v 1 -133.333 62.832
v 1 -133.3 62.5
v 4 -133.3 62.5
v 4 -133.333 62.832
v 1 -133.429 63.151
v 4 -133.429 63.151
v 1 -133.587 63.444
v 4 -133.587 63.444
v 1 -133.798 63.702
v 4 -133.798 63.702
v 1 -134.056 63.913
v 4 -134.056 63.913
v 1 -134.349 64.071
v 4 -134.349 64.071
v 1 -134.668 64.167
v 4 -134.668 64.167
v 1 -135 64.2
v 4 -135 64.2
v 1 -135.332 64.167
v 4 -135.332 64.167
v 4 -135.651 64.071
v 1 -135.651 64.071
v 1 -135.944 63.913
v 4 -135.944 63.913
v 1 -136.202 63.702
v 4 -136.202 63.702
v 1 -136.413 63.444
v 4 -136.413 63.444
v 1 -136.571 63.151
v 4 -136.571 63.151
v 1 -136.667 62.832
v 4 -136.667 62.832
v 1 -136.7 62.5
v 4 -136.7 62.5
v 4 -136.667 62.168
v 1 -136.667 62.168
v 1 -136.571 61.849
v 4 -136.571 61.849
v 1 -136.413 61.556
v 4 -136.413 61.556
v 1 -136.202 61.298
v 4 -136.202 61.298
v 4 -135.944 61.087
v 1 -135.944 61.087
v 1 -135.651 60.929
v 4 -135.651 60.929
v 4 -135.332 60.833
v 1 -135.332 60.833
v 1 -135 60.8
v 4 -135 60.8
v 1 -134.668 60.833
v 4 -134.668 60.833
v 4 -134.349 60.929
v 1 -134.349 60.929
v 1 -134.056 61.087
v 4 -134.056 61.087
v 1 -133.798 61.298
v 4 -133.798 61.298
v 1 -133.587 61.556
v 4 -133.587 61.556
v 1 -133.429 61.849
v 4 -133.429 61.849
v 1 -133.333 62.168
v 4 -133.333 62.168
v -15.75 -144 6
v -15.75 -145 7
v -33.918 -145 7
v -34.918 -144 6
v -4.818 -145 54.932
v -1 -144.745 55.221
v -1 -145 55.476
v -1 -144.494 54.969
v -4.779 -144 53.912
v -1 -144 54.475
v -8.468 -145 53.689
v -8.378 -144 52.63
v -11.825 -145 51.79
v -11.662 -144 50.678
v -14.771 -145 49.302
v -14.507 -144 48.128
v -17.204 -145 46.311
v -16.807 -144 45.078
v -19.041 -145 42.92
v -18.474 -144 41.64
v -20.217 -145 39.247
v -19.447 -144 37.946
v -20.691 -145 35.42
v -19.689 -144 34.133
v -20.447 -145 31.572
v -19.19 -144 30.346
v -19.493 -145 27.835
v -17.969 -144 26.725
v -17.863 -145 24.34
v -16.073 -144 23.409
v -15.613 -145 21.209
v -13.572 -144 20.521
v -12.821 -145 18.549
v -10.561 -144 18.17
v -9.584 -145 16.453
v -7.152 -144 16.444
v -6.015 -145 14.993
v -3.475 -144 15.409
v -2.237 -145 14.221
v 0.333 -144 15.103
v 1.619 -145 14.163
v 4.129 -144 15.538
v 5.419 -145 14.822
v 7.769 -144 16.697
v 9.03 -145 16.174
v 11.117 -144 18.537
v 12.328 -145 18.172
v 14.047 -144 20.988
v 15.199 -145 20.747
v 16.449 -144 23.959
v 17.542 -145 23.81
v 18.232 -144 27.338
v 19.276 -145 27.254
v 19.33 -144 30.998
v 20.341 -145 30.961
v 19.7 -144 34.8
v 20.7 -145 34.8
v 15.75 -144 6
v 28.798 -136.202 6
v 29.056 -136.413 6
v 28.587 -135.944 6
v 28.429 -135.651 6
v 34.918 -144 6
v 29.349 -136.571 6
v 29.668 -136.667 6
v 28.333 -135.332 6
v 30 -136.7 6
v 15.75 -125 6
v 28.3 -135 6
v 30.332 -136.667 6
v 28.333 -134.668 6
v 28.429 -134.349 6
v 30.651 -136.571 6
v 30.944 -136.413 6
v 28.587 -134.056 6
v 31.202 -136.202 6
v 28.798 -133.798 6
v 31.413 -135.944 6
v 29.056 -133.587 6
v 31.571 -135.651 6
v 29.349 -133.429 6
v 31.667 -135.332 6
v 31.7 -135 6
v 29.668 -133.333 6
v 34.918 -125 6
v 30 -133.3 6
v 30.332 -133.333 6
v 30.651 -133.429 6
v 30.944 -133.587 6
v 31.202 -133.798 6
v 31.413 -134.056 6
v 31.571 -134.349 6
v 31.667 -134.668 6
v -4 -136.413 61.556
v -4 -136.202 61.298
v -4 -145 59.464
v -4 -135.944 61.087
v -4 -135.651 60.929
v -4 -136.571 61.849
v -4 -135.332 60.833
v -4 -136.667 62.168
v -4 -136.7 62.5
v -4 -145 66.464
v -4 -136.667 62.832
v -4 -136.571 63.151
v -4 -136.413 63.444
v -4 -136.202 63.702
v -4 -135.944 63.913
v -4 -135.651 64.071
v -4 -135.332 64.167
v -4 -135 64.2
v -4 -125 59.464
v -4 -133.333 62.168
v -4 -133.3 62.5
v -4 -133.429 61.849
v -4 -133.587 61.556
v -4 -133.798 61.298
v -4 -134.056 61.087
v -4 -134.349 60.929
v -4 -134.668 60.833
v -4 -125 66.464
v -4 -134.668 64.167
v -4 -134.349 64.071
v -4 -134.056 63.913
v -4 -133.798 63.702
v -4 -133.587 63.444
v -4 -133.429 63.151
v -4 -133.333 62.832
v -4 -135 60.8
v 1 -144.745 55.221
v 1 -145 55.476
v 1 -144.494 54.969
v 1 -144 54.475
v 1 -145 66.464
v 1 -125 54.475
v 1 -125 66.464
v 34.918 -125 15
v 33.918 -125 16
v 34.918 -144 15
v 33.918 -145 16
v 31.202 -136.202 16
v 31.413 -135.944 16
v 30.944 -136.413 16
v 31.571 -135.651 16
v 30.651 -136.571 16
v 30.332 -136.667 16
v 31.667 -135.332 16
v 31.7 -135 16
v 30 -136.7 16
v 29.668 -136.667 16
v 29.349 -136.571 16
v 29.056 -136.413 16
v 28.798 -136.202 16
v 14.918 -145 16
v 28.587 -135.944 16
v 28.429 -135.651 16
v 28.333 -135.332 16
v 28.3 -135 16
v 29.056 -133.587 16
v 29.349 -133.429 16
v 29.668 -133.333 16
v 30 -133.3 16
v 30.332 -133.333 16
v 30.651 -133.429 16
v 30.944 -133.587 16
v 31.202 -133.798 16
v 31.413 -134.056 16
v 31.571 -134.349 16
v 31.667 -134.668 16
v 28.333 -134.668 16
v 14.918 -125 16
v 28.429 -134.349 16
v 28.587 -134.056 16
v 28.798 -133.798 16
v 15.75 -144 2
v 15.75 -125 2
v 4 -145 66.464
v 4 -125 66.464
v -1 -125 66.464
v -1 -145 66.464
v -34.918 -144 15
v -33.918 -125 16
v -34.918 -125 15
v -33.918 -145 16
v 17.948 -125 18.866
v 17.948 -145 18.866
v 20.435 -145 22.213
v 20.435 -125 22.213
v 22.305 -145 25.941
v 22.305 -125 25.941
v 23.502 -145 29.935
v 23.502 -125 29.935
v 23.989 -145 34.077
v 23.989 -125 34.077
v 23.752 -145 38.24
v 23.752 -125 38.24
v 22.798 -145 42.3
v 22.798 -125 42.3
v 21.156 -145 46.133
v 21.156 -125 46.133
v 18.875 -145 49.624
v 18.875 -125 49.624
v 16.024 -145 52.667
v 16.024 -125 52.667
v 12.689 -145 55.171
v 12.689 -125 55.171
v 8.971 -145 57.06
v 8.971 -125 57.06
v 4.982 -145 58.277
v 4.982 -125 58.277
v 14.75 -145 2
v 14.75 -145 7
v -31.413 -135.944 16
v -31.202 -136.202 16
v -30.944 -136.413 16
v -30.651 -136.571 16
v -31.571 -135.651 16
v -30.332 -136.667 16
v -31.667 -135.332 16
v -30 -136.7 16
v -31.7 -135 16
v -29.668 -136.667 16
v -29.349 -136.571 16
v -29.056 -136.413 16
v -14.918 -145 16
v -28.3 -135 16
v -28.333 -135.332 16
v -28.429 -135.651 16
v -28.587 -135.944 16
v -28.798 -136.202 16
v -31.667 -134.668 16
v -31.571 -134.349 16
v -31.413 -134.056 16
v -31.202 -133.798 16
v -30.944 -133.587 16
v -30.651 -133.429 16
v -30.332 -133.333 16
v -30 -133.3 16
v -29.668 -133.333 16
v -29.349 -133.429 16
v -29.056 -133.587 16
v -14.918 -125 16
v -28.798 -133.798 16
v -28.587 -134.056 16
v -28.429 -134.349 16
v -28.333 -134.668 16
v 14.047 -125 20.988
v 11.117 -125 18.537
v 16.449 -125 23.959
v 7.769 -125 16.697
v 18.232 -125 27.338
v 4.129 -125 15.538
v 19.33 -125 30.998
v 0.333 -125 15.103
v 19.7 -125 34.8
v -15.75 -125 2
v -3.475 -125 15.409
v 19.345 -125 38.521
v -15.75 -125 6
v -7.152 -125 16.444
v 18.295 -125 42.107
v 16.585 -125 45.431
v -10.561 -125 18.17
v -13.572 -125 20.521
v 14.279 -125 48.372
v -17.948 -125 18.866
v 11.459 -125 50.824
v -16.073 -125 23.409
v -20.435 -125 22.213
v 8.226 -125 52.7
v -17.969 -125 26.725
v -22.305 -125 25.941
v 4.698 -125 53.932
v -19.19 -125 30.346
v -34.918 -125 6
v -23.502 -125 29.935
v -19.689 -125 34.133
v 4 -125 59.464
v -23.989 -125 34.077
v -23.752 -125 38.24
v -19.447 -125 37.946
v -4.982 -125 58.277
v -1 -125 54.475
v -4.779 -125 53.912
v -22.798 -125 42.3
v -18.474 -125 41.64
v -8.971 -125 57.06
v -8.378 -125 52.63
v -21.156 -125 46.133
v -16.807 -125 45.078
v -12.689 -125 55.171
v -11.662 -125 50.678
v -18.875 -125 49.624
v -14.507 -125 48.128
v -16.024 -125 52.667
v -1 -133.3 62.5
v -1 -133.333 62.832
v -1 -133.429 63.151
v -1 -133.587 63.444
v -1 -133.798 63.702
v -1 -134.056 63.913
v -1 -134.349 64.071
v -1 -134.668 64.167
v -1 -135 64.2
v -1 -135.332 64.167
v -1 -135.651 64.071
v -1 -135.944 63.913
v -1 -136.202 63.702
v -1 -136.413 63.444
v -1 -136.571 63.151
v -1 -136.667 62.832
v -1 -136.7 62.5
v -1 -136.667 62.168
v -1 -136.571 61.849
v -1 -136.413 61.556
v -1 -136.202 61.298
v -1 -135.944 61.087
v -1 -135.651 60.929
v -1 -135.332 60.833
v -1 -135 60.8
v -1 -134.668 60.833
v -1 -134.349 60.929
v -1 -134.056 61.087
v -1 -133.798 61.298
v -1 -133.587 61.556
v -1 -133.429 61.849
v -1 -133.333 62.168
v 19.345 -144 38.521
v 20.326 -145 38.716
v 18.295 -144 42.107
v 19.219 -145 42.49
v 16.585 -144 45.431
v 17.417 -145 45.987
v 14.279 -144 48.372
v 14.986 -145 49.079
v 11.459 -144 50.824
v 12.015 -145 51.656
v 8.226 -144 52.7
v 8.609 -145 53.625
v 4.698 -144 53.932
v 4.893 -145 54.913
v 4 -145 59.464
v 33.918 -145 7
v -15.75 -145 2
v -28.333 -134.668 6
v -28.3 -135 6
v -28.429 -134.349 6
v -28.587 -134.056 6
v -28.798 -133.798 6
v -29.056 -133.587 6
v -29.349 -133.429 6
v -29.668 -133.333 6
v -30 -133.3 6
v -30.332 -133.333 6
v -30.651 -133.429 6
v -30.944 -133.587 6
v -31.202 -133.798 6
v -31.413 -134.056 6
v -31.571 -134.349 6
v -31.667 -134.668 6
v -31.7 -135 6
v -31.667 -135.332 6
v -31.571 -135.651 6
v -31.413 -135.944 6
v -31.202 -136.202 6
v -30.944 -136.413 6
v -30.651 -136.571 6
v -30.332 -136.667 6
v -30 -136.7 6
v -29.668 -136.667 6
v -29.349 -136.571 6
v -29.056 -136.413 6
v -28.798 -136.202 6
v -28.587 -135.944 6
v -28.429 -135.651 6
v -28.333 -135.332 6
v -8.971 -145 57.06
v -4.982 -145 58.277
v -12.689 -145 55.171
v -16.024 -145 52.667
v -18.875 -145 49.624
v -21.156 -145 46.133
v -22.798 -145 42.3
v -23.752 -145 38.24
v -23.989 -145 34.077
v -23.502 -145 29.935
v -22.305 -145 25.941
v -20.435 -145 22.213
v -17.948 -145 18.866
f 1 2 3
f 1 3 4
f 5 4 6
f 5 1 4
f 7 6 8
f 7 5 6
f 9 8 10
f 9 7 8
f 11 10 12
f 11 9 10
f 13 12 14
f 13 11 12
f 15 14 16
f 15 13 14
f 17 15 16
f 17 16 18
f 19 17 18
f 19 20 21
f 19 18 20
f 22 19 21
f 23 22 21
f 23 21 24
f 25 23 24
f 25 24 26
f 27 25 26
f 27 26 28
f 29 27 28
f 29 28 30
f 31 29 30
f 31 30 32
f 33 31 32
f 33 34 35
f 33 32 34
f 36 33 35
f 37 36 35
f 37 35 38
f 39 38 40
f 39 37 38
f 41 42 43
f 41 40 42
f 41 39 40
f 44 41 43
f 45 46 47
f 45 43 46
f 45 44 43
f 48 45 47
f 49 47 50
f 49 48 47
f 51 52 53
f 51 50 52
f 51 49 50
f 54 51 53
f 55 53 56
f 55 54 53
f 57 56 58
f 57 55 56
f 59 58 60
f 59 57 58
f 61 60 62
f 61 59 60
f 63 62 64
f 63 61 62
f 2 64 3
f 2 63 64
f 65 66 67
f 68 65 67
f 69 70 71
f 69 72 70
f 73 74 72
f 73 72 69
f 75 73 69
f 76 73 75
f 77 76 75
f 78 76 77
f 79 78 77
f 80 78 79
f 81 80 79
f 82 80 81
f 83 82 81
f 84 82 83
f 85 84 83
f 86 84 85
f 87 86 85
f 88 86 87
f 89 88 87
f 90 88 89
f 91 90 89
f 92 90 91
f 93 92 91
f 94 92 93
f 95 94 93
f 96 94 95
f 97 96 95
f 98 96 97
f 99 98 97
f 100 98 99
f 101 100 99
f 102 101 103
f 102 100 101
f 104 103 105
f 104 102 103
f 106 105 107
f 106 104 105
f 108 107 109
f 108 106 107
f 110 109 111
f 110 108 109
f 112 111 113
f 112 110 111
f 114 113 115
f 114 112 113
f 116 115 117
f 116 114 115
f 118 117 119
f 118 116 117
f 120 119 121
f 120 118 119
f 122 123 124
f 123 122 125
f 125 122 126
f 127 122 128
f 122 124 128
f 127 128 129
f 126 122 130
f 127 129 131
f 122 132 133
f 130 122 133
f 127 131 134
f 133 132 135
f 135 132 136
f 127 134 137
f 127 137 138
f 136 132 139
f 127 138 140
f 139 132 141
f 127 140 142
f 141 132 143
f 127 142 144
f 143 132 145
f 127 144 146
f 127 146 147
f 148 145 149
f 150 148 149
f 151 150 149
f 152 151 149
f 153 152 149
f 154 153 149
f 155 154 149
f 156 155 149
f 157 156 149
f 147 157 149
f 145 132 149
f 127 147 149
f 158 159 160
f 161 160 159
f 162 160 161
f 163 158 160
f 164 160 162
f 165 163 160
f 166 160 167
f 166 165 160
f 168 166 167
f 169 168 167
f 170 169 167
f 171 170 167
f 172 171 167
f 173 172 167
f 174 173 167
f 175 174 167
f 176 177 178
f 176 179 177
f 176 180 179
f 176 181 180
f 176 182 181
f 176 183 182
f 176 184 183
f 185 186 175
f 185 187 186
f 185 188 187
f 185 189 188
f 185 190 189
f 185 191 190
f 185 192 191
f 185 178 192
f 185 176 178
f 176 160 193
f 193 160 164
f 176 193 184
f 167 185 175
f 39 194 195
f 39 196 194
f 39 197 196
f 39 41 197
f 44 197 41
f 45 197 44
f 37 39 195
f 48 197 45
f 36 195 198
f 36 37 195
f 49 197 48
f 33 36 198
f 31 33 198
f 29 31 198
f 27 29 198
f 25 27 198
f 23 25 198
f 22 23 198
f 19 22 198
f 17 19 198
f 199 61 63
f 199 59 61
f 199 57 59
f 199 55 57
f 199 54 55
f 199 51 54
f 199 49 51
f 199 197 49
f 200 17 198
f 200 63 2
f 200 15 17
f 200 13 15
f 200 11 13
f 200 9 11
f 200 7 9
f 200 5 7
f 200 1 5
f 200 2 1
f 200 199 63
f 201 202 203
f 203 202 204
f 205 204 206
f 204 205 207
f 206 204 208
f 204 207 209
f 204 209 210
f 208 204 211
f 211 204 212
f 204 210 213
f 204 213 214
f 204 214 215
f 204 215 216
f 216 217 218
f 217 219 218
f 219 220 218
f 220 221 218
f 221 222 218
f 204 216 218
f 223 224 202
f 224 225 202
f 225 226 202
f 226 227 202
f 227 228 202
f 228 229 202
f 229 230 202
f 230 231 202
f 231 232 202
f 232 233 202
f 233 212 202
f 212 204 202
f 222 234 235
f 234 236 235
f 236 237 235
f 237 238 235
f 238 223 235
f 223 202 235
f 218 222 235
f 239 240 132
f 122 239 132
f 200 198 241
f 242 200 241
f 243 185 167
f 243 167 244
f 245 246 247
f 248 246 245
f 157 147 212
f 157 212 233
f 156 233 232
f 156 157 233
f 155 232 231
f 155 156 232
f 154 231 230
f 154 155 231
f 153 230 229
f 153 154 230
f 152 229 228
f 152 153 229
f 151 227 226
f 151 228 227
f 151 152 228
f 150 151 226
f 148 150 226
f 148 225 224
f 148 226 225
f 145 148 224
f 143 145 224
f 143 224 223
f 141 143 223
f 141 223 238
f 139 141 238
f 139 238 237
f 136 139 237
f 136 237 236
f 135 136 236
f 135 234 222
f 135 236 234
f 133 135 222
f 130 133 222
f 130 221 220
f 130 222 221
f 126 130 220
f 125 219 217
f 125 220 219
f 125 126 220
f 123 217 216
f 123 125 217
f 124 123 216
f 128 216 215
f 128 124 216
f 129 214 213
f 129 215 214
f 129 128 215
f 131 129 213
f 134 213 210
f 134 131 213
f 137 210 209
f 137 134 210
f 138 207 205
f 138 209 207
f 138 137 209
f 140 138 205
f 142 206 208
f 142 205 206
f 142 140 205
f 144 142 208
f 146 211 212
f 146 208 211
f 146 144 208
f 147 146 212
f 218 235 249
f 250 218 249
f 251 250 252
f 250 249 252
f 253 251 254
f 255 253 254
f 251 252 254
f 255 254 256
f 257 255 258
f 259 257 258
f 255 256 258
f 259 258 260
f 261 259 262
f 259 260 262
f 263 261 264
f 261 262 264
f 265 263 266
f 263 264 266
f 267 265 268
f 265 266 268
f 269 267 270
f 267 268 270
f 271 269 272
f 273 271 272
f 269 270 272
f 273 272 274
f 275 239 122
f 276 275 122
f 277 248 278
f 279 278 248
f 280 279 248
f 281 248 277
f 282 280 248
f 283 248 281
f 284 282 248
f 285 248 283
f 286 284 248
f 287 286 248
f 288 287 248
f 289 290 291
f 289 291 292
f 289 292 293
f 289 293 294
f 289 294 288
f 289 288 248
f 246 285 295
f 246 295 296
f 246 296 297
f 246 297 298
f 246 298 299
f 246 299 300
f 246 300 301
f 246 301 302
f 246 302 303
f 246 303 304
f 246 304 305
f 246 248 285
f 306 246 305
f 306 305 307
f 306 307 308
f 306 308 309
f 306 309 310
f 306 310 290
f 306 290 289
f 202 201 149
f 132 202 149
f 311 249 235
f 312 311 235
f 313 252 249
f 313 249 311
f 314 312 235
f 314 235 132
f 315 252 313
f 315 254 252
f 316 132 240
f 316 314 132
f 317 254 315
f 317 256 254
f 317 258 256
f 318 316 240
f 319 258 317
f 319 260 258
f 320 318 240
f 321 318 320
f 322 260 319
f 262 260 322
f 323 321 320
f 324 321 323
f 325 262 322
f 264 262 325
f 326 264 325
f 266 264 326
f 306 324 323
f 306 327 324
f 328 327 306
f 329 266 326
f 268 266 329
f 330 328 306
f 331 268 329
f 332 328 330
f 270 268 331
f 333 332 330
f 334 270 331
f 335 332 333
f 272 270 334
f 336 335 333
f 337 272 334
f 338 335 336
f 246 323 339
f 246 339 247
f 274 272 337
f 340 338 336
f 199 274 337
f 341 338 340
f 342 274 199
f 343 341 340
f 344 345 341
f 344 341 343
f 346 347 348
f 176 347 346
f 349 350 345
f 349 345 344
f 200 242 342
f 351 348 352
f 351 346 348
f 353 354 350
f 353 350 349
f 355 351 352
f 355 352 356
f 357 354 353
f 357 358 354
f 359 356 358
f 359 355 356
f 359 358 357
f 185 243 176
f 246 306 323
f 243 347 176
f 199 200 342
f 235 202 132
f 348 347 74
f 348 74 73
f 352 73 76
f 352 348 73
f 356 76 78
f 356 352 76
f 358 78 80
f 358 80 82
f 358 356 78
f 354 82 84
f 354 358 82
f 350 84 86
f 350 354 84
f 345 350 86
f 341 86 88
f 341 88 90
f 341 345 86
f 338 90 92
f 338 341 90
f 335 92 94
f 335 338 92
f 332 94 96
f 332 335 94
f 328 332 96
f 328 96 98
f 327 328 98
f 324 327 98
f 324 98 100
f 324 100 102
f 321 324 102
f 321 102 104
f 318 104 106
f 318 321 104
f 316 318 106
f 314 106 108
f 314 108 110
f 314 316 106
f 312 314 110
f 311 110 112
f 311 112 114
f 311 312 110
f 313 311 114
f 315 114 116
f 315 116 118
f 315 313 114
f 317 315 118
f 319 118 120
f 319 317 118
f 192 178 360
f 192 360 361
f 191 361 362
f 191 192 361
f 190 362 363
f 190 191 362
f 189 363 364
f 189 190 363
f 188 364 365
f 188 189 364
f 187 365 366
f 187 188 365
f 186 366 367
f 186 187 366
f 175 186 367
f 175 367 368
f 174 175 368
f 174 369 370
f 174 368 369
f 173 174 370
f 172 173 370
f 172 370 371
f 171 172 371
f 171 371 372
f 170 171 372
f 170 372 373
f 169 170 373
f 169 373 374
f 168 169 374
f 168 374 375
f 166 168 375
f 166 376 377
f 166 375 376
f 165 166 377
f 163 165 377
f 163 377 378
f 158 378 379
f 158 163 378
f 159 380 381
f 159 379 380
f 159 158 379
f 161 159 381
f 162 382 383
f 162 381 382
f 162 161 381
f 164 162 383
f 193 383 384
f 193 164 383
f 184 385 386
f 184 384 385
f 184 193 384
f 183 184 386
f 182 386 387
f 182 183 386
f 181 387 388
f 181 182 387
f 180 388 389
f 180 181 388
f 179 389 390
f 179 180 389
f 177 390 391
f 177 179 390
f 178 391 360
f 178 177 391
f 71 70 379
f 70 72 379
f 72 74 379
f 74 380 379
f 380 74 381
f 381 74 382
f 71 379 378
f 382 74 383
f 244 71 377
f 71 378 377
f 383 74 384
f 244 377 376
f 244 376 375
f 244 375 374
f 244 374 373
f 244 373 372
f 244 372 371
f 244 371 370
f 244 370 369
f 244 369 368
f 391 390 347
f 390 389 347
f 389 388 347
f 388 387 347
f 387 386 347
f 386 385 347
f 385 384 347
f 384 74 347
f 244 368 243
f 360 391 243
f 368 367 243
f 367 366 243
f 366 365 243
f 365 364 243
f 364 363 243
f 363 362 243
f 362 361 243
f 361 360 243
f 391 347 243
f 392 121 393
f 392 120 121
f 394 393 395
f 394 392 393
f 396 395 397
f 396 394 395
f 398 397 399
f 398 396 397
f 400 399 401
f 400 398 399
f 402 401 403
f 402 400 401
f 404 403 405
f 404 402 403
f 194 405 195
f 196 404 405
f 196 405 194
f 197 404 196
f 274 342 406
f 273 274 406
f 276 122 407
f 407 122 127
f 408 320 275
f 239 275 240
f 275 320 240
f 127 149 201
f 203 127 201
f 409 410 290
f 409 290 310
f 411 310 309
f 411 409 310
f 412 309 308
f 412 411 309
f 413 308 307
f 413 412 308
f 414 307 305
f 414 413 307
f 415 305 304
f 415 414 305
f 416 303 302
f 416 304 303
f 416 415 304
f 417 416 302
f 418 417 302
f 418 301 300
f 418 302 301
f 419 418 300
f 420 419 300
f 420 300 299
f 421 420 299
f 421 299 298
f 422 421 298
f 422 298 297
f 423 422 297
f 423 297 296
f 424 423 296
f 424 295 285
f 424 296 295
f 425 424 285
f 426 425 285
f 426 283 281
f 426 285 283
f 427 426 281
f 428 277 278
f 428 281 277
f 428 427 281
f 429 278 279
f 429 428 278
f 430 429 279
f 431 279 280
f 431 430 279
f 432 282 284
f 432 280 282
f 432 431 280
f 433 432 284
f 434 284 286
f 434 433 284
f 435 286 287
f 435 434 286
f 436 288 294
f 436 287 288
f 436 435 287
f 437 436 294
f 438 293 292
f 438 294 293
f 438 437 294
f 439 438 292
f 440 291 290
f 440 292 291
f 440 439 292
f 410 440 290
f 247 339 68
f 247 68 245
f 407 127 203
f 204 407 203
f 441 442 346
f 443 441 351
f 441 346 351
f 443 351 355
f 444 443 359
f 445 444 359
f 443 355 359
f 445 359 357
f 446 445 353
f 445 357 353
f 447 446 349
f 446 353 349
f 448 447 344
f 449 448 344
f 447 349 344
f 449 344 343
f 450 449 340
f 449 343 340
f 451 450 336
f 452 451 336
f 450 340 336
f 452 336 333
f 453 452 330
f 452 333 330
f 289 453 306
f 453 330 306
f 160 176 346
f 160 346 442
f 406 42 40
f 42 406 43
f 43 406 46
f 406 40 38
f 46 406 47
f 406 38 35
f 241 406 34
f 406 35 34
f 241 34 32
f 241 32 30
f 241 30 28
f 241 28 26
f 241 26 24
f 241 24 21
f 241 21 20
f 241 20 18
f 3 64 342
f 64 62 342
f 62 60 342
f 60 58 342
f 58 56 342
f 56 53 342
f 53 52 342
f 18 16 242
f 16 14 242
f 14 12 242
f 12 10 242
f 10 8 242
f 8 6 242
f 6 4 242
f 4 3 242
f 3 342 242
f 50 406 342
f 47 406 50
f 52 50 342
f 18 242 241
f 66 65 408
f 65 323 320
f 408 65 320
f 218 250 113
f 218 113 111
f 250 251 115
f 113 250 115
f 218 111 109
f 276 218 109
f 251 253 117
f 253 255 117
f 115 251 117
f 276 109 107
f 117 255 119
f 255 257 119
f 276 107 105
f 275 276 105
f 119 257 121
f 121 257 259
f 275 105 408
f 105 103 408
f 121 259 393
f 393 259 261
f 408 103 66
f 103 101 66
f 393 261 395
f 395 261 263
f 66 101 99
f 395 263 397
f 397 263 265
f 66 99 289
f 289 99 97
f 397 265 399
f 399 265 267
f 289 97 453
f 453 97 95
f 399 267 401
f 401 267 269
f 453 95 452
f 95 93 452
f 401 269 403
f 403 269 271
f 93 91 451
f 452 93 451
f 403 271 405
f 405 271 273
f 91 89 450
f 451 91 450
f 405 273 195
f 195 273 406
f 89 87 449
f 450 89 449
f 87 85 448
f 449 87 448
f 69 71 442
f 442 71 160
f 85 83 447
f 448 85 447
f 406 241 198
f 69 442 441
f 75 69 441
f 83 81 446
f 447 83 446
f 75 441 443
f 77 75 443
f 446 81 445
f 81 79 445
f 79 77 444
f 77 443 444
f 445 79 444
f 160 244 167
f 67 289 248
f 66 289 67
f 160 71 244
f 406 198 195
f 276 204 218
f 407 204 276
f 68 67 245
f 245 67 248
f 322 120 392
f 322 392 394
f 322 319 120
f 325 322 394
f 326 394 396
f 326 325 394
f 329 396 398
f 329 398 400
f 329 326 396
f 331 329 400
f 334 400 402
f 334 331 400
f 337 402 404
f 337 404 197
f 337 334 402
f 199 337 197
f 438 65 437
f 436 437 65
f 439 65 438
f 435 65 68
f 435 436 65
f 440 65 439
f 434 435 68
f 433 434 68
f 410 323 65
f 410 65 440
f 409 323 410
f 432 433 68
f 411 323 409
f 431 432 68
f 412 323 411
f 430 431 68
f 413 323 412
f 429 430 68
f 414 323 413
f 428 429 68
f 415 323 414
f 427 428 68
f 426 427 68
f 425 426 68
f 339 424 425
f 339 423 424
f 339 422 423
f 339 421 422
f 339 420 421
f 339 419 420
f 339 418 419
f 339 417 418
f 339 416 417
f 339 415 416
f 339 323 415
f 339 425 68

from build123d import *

# Parameters (mm, degrees)
SKETCH_R        = 19.7
PAD011_DEPTH    = 20
SKETCH020_W     = 2
SKETCH020_H     = 18
POCKET001_DEPTH = 30
SKETCH021_R     = 1.7
HOLE001_DEPTH   = 25
SKETCH022_R     = 1.7
HOLE002_DEPTH   = 25
CHAMFER003_SIZE = 1


with BuildPart() as part:
    # Sketch → Pad011 (new body)
    with BuildSketch(Plane.XZ.offset(100)):
        with BuildLine():
            Line((-34.918445, 6), (-34.918445, 16))
            Line((-34.918445, 16), (-14.918445, 16))
            ThreePointArc((-4, 58.464319), (-23.243956, 40.776496), (-14.918445, 16))
            Line((-4, 58.464319), (-4, 66.464319))
            Line((-4, 66.464319), (4, 66.464319))
            Line((4, 58.464319), (4, 66.464319))
            ThreePointArc((14.918445, 16), (23.243956, 40.776496), (4, 58.464319))
            Line((34.918445, 16), (14.918445, 16))
            Line((34.918445, 6), (34.918445, 16))
            Line((15.75, 6), (34.918445, 6))
            Line((15.75, 2), (15.75, 6))
            Line((-15.75, 2), (15.75, 2))
            Line((-15.75, 6), (-15.75, 2))
            Line((-15.75, 6), (-34.918445, 6))
        make_face()
        with Locations((0, 34.8)):
            Circle(SKETCH_R, mode=Mode.SUBTRACT)
    extrude(amount=PAD011_DEPTH)

    # Sketch020 → Pocket001 (cut)
    with BuildSketch(Plane.XZ.offset(98)):
        with Locations((0, 59.399123)):
            Rectangle(SKETCH020_W, SKETCH020_H)
    extrude(amount=POCKET001_DEPTH, mode=Mode.SUBTRACT)

    # Sketch021 → Hole001 (cut)
    with BuildSketch(Plane.XY):
        with Locations((-30, -110)):
            Circle(SKETCH021_R)
        with Locations((30, -110)):
            Circle(SKETCH021_R)
    extrude(amount=HOLE001_DEPTH, mode=Mode.SUBTRACT)

    # Sketch022 → Hole002 (cut)
    with BuildSketch(Plane.YZ.offset(-10)):
        with Locations((-110, 62.5)):
            Circle(SKETCH022_R)
    extrude(amount=HOLE002_DEPTH, mode=Mode.SUBTRACT)

    # Chamfer003
    chamfer003_edges = [part.edges().sort_by_distance(p)[0] for p in [
        (-13.571846, -120, 20.520819),
        (14.279181, -120, 48.371846),
        (-4, -110, 58.464319),
        (4, -110, 58.464319),
        (34.918445, -110, 16),
        (-34.918445, -110, 16),
        (-34.918445, -120, 11),
        (34.918445, -120, 11),
        (-25.334222, -120, 6),
        (15.75, -120, 4),
        (25.334222, -120, 6),
    ]]
    chamfer(chamfer003_edges, length=CHAMFER003_SIZE)


with BuildPart() as part_1:
    # Body placement: moved
    add(part.part.moved(Location((0, -25, 0))))


solid = part_1.part
